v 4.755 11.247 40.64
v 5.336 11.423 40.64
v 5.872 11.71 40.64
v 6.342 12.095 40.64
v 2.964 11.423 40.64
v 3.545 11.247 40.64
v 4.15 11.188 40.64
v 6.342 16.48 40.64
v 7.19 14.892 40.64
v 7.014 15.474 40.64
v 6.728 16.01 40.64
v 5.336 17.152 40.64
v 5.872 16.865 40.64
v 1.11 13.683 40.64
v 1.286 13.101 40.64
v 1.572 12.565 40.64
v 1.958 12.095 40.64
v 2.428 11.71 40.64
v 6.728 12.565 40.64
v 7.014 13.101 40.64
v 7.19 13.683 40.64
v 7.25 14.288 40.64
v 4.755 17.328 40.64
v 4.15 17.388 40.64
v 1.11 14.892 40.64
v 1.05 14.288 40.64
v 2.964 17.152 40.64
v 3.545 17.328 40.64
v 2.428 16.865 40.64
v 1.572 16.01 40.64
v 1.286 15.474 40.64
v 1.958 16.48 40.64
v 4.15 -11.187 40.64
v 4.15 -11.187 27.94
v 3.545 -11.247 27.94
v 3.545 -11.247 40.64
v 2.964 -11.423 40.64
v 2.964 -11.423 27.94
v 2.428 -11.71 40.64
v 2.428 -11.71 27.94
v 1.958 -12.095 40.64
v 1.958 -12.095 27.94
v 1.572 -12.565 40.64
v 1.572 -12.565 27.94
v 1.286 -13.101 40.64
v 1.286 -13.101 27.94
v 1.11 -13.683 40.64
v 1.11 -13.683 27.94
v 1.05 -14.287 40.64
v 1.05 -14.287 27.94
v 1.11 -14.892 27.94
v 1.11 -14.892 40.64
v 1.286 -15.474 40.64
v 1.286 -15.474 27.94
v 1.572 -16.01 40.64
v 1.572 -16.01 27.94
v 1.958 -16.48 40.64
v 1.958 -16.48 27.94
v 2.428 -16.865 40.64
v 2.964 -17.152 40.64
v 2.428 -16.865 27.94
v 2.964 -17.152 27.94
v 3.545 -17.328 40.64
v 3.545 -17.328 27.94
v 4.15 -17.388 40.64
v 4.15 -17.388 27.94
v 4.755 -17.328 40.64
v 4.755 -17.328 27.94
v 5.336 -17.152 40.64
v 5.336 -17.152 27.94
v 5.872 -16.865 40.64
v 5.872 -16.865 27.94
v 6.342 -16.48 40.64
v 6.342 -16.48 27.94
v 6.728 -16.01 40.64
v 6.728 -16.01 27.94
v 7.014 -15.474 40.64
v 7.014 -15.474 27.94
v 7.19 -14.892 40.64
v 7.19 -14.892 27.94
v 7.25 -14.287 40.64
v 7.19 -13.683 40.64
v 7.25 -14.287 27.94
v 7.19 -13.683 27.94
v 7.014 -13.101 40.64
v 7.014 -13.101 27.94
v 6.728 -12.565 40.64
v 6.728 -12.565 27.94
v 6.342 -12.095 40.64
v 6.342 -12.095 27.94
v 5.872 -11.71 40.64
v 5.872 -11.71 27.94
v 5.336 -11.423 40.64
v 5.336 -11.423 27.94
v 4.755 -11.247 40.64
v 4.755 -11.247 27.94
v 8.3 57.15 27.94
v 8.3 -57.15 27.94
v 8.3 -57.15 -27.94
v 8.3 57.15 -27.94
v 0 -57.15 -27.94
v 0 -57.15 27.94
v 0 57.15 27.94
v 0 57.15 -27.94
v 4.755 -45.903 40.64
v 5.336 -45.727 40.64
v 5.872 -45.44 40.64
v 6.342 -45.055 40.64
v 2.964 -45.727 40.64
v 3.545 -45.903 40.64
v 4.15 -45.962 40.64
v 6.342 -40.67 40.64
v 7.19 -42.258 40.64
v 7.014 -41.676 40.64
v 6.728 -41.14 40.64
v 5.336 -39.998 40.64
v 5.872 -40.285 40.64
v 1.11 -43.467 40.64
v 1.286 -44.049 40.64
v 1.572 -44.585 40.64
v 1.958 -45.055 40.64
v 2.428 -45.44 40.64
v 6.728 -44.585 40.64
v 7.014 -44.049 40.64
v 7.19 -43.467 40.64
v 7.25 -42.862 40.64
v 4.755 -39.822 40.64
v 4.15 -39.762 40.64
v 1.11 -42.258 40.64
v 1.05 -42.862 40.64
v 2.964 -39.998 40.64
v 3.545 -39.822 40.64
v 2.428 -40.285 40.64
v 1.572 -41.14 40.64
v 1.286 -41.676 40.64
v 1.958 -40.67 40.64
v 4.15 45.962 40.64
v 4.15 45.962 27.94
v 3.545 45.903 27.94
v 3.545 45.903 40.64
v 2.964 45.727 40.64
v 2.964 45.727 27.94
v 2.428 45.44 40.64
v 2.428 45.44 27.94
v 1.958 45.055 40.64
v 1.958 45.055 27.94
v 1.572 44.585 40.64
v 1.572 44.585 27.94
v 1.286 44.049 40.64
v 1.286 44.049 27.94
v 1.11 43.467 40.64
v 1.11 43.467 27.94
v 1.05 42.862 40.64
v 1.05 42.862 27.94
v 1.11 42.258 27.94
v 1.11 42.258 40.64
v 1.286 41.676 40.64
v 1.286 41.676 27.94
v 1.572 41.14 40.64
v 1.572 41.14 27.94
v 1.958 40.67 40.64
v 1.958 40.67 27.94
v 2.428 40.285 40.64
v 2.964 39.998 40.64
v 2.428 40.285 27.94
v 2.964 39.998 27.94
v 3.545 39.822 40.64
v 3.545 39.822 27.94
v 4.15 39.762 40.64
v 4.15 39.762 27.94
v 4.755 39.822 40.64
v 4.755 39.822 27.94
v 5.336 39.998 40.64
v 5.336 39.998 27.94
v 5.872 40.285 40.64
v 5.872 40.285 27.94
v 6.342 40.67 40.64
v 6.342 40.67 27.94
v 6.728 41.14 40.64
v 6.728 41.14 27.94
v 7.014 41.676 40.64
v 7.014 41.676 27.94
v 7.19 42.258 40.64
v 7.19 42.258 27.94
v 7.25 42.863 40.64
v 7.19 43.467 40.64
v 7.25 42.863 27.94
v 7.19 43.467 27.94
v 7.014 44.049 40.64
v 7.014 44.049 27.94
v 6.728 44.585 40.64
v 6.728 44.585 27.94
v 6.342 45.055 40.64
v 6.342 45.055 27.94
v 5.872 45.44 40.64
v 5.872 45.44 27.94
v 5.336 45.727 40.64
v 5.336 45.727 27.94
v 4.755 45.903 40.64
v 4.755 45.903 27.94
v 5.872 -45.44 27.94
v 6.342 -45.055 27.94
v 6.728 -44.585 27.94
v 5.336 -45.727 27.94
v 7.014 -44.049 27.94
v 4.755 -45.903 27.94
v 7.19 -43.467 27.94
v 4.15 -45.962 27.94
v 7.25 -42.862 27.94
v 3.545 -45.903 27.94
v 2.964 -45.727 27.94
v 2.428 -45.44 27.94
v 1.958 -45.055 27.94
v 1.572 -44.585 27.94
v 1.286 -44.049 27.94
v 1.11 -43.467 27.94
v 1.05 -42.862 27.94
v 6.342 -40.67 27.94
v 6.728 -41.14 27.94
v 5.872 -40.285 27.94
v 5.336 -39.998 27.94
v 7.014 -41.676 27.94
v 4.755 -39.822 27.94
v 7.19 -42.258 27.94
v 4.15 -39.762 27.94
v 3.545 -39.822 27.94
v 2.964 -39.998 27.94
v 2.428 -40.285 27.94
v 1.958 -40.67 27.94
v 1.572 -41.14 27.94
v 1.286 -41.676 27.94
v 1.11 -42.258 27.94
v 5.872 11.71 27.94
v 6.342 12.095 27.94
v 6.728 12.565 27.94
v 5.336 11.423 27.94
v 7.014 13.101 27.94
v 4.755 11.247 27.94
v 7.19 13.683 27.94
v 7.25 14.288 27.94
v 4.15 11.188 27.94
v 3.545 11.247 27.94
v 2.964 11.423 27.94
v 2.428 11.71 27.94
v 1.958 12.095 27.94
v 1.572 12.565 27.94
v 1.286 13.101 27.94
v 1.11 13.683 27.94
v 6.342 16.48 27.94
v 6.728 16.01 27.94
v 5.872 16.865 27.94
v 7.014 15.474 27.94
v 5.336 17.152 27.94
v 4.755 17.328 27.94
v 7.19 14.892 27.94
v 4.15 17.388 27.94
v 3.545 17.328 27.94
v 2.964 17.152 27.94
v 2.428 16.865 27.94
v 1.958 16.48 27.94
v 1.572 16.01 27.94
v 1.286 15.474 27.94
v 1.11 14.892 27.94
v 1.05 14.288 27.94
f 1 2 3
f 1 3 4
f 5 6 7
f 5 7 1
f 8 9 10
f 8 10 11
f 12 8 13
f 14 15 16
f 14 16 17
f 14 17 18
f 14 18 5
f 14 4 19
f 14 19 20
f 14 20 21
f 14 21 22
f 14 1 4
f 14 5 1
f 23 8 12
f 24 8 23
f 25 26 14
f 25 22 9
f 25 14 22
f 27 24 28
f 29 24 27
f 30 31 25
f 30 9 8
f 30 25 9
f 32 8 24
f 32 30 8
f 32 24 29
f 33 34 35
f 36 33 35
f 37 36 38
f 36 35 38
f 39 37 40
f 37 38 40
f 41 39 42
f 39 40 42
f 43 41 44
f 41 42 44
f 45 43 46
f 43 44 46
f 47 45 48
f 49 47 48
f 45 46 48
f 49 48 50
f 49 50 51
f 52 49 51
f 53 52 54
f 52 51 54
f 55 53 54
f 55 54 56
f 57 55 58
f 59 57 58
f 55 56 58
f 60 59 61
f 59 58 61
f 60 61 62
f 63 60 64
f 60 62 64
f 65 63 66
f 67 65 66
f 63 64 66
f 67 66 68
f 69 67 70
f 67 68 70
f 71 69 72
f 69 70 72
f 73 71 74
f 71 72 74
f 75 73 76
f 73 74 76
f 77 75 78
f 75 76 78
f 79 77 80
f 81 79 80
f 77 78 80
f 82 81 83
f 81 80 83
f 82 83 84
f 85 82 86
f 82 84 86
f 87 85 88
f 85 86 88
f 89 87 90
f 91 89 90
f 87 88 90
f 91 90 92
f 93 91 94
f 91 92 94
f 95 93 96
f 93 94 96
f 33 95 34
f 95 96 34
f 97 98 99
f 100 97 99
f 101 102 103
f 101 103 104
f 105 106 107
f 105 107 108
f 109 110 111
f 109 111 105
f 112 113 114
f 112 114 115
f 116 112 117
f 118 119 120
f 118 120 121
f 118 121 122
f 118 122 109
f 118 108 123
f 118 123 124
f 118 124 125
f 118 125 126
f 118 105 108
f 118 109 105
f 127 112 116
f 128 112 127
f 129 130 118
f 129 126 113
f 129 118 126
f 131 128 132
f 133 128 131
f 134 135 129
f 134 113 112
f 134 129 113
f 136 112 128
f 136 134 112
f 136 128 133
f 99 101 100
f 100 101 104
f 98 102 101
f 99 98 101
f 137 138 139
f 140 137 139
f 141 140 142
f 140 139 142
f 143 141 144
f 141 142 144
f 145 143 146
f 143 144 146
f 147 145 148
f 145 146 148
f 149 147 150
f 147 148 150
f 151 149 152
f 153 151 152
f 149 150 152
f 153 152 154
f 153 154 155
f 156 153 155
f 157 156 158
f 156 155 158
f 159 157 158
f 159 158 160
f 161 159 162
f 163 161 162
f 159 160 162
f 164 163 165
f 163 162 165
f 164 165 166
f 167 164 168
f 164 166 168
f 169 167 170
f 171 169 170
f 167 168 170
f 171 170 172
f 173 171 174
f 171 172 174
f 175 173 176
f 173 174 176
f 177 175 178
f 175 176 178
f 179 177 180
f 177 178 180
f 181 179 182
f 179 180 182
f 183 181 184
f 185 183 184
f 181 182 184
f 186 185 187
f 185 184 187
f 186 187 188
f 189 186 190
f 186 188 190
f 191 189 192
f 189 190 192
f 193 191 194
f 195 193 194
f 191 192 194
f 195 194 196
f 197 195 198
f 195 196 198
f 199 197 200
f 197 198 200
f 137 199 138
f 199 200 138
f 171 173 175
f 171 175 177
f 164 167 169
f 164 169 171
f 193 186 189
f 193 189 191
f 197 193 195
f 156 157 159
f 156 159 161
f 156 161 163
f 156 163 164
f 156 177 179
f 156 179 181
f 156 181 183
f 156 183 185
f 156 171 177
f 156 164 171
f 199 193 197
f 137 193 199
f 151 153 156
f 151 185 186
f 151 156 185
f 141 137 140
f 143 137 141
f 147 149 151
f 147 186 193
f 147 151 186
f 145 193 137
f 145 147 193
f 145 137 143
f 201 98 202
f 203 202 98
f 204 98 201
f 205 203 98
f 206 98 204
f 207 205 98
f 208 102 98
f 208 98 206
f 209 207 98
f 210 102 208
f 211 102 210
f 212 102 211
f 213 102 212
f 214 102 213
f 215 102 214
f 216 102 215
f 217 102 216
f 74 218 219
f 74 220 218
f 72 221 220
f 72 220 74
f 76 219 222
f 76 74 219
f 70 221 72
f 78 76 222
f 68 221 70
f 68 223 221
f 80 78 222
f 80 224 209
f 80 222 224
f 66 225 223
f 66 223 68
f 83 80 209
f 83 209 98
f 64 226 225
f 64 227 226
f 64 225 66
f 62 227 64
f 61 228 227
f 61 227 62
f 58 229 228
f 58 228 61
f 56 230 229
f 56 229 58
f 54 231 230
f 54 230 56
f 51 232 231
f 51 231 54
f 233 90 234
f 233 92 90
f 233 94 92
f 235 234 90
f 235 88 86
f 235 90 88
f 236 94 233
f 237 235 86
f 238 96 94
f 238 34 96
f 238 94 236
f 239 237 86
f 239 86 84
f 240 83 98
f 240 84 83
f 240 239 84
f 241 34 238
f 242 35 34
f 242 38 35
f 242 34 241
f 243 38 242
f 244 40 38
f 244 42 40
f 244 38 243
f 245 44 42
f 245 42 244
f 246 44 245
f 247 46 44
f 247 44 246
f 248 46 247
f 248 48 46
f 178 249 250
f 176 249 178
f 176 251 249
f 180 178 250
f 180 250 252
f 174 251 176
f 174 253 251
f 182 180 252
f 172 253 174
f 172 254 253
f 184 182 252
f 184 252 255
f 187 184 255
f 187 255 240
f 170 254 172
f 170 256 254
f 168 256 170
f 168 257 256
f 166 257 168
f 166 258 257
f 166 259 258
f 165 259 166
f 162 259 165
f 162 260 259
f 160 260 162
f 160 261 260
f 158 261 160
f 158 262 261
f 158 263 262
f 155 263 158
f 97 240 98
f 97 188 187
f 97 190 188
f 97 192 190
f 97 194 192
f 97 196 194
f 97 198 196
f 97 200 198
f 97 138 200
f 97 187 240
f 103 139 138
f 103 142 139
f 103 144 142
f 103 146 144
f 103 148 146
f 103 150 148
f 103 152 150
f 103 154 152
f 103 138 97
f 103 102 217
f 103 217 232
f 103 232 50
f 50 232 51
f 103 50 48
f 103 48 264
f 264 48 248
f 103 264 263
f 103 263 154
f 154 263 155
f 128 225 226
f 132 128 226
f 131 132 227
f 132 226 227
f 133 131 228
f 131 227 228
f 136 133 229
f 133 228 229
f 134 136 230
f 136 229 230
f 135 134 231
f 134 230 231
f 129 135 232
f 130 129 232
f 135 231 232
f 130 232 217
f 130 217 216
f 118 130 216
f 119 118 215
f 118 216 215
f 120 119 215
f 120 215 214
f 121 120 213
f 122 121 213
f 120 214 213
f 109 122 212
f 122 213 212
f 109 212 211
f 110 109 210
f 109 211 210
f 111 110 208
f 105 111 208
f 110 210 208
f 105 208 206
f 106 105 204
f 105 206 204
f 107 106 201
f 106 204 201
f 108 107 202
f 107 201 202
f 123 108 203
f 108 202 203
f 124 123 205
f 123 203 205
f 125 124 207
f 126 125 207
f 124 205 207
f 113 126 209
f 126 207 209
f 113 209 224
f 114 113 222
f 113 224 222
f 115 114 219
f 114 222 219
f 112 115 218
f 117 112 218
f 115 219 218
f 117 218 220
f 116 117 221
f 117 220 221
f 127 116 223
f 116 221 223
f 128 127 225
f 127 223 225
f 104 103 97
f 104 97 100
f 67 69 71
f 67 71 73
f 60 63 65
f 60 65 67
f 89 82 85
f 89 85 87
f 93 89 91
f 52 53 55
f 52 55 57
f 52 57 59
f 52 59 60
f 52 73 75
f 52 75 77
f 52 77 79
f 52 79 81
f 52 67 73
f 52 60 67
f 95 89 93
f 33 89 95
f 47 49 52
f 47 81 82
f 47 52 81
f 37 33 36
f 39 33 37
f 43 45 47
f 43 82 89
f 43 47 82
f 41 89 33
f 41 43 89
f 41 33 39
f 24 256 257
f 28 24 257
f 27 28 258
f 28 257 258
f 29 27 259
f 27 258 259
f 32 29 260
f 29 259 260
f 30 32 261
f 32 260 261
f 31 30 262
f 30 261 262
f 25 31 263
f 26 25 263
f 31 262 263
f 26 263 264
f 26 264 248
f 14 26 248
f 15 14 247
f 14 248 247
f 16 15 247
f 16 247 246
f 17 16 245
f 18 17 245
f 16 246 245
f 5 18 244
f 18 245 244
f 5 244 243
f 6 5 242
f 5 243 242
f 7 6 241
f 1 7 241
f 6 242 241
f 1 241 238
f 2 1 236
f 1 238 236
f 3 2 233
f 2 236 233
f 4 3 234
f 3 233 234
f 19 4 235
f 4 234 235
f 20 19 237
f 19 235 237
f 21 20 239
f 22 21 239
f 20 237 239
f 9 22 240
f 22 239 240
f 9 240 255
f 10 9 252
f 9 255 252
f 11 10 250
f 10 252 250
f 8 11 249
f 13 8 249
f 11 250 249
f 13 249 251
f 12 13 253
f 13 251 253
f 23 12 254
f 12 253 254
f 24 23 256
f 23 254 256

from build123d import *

# Parameters (mm, degrees)
SKETCH1_W           = 55.88
SKETCH1_H           = 114.3
BOSS_EXTRUDE1_DEPTH = 8.3
SKETCH2_R           = 3.1
BOSS_EXTRUDE2_DEPTH = 12.7
LPATTERN1_COUNT     = 4
LPATTERN1_PITCH     = 28.575


with BuildPart() as part:
    # Sketch1 → Boss-Extrude1 (new body)
    with BuildSketch(Plane(origin=(0, 0, 0), x_dir=(0, 0, -1), z_dir=(1, 0, 0))):
        Rectangle(SKETCH1_W, SKETCH1_H)
    extrude(amount=BOSS_EXTRUDE1_DEPTH)

    # Sketch2 → Boss-Extrude2 (add)
    with BuildSketch(Plane.XY.offset(27.94)):
        with Locations(Location((4.15, -42.8625, 0), (0, 0, 90))):  # turned: the seam where the file's is
            Circle(SKETCH2_R)
    boss_extrude2 = extrude(amount=BOSS_EXTRUDE2_DEPTH)

    # LPattern1: Boss-Extrude2 ×4
    with Locations(*[(0, i * LPATTERN1_PITCH, 0) for i in range(1, LPATTERN1_COUNT)]):
        add(boss_extrude2)


solid = part.part
